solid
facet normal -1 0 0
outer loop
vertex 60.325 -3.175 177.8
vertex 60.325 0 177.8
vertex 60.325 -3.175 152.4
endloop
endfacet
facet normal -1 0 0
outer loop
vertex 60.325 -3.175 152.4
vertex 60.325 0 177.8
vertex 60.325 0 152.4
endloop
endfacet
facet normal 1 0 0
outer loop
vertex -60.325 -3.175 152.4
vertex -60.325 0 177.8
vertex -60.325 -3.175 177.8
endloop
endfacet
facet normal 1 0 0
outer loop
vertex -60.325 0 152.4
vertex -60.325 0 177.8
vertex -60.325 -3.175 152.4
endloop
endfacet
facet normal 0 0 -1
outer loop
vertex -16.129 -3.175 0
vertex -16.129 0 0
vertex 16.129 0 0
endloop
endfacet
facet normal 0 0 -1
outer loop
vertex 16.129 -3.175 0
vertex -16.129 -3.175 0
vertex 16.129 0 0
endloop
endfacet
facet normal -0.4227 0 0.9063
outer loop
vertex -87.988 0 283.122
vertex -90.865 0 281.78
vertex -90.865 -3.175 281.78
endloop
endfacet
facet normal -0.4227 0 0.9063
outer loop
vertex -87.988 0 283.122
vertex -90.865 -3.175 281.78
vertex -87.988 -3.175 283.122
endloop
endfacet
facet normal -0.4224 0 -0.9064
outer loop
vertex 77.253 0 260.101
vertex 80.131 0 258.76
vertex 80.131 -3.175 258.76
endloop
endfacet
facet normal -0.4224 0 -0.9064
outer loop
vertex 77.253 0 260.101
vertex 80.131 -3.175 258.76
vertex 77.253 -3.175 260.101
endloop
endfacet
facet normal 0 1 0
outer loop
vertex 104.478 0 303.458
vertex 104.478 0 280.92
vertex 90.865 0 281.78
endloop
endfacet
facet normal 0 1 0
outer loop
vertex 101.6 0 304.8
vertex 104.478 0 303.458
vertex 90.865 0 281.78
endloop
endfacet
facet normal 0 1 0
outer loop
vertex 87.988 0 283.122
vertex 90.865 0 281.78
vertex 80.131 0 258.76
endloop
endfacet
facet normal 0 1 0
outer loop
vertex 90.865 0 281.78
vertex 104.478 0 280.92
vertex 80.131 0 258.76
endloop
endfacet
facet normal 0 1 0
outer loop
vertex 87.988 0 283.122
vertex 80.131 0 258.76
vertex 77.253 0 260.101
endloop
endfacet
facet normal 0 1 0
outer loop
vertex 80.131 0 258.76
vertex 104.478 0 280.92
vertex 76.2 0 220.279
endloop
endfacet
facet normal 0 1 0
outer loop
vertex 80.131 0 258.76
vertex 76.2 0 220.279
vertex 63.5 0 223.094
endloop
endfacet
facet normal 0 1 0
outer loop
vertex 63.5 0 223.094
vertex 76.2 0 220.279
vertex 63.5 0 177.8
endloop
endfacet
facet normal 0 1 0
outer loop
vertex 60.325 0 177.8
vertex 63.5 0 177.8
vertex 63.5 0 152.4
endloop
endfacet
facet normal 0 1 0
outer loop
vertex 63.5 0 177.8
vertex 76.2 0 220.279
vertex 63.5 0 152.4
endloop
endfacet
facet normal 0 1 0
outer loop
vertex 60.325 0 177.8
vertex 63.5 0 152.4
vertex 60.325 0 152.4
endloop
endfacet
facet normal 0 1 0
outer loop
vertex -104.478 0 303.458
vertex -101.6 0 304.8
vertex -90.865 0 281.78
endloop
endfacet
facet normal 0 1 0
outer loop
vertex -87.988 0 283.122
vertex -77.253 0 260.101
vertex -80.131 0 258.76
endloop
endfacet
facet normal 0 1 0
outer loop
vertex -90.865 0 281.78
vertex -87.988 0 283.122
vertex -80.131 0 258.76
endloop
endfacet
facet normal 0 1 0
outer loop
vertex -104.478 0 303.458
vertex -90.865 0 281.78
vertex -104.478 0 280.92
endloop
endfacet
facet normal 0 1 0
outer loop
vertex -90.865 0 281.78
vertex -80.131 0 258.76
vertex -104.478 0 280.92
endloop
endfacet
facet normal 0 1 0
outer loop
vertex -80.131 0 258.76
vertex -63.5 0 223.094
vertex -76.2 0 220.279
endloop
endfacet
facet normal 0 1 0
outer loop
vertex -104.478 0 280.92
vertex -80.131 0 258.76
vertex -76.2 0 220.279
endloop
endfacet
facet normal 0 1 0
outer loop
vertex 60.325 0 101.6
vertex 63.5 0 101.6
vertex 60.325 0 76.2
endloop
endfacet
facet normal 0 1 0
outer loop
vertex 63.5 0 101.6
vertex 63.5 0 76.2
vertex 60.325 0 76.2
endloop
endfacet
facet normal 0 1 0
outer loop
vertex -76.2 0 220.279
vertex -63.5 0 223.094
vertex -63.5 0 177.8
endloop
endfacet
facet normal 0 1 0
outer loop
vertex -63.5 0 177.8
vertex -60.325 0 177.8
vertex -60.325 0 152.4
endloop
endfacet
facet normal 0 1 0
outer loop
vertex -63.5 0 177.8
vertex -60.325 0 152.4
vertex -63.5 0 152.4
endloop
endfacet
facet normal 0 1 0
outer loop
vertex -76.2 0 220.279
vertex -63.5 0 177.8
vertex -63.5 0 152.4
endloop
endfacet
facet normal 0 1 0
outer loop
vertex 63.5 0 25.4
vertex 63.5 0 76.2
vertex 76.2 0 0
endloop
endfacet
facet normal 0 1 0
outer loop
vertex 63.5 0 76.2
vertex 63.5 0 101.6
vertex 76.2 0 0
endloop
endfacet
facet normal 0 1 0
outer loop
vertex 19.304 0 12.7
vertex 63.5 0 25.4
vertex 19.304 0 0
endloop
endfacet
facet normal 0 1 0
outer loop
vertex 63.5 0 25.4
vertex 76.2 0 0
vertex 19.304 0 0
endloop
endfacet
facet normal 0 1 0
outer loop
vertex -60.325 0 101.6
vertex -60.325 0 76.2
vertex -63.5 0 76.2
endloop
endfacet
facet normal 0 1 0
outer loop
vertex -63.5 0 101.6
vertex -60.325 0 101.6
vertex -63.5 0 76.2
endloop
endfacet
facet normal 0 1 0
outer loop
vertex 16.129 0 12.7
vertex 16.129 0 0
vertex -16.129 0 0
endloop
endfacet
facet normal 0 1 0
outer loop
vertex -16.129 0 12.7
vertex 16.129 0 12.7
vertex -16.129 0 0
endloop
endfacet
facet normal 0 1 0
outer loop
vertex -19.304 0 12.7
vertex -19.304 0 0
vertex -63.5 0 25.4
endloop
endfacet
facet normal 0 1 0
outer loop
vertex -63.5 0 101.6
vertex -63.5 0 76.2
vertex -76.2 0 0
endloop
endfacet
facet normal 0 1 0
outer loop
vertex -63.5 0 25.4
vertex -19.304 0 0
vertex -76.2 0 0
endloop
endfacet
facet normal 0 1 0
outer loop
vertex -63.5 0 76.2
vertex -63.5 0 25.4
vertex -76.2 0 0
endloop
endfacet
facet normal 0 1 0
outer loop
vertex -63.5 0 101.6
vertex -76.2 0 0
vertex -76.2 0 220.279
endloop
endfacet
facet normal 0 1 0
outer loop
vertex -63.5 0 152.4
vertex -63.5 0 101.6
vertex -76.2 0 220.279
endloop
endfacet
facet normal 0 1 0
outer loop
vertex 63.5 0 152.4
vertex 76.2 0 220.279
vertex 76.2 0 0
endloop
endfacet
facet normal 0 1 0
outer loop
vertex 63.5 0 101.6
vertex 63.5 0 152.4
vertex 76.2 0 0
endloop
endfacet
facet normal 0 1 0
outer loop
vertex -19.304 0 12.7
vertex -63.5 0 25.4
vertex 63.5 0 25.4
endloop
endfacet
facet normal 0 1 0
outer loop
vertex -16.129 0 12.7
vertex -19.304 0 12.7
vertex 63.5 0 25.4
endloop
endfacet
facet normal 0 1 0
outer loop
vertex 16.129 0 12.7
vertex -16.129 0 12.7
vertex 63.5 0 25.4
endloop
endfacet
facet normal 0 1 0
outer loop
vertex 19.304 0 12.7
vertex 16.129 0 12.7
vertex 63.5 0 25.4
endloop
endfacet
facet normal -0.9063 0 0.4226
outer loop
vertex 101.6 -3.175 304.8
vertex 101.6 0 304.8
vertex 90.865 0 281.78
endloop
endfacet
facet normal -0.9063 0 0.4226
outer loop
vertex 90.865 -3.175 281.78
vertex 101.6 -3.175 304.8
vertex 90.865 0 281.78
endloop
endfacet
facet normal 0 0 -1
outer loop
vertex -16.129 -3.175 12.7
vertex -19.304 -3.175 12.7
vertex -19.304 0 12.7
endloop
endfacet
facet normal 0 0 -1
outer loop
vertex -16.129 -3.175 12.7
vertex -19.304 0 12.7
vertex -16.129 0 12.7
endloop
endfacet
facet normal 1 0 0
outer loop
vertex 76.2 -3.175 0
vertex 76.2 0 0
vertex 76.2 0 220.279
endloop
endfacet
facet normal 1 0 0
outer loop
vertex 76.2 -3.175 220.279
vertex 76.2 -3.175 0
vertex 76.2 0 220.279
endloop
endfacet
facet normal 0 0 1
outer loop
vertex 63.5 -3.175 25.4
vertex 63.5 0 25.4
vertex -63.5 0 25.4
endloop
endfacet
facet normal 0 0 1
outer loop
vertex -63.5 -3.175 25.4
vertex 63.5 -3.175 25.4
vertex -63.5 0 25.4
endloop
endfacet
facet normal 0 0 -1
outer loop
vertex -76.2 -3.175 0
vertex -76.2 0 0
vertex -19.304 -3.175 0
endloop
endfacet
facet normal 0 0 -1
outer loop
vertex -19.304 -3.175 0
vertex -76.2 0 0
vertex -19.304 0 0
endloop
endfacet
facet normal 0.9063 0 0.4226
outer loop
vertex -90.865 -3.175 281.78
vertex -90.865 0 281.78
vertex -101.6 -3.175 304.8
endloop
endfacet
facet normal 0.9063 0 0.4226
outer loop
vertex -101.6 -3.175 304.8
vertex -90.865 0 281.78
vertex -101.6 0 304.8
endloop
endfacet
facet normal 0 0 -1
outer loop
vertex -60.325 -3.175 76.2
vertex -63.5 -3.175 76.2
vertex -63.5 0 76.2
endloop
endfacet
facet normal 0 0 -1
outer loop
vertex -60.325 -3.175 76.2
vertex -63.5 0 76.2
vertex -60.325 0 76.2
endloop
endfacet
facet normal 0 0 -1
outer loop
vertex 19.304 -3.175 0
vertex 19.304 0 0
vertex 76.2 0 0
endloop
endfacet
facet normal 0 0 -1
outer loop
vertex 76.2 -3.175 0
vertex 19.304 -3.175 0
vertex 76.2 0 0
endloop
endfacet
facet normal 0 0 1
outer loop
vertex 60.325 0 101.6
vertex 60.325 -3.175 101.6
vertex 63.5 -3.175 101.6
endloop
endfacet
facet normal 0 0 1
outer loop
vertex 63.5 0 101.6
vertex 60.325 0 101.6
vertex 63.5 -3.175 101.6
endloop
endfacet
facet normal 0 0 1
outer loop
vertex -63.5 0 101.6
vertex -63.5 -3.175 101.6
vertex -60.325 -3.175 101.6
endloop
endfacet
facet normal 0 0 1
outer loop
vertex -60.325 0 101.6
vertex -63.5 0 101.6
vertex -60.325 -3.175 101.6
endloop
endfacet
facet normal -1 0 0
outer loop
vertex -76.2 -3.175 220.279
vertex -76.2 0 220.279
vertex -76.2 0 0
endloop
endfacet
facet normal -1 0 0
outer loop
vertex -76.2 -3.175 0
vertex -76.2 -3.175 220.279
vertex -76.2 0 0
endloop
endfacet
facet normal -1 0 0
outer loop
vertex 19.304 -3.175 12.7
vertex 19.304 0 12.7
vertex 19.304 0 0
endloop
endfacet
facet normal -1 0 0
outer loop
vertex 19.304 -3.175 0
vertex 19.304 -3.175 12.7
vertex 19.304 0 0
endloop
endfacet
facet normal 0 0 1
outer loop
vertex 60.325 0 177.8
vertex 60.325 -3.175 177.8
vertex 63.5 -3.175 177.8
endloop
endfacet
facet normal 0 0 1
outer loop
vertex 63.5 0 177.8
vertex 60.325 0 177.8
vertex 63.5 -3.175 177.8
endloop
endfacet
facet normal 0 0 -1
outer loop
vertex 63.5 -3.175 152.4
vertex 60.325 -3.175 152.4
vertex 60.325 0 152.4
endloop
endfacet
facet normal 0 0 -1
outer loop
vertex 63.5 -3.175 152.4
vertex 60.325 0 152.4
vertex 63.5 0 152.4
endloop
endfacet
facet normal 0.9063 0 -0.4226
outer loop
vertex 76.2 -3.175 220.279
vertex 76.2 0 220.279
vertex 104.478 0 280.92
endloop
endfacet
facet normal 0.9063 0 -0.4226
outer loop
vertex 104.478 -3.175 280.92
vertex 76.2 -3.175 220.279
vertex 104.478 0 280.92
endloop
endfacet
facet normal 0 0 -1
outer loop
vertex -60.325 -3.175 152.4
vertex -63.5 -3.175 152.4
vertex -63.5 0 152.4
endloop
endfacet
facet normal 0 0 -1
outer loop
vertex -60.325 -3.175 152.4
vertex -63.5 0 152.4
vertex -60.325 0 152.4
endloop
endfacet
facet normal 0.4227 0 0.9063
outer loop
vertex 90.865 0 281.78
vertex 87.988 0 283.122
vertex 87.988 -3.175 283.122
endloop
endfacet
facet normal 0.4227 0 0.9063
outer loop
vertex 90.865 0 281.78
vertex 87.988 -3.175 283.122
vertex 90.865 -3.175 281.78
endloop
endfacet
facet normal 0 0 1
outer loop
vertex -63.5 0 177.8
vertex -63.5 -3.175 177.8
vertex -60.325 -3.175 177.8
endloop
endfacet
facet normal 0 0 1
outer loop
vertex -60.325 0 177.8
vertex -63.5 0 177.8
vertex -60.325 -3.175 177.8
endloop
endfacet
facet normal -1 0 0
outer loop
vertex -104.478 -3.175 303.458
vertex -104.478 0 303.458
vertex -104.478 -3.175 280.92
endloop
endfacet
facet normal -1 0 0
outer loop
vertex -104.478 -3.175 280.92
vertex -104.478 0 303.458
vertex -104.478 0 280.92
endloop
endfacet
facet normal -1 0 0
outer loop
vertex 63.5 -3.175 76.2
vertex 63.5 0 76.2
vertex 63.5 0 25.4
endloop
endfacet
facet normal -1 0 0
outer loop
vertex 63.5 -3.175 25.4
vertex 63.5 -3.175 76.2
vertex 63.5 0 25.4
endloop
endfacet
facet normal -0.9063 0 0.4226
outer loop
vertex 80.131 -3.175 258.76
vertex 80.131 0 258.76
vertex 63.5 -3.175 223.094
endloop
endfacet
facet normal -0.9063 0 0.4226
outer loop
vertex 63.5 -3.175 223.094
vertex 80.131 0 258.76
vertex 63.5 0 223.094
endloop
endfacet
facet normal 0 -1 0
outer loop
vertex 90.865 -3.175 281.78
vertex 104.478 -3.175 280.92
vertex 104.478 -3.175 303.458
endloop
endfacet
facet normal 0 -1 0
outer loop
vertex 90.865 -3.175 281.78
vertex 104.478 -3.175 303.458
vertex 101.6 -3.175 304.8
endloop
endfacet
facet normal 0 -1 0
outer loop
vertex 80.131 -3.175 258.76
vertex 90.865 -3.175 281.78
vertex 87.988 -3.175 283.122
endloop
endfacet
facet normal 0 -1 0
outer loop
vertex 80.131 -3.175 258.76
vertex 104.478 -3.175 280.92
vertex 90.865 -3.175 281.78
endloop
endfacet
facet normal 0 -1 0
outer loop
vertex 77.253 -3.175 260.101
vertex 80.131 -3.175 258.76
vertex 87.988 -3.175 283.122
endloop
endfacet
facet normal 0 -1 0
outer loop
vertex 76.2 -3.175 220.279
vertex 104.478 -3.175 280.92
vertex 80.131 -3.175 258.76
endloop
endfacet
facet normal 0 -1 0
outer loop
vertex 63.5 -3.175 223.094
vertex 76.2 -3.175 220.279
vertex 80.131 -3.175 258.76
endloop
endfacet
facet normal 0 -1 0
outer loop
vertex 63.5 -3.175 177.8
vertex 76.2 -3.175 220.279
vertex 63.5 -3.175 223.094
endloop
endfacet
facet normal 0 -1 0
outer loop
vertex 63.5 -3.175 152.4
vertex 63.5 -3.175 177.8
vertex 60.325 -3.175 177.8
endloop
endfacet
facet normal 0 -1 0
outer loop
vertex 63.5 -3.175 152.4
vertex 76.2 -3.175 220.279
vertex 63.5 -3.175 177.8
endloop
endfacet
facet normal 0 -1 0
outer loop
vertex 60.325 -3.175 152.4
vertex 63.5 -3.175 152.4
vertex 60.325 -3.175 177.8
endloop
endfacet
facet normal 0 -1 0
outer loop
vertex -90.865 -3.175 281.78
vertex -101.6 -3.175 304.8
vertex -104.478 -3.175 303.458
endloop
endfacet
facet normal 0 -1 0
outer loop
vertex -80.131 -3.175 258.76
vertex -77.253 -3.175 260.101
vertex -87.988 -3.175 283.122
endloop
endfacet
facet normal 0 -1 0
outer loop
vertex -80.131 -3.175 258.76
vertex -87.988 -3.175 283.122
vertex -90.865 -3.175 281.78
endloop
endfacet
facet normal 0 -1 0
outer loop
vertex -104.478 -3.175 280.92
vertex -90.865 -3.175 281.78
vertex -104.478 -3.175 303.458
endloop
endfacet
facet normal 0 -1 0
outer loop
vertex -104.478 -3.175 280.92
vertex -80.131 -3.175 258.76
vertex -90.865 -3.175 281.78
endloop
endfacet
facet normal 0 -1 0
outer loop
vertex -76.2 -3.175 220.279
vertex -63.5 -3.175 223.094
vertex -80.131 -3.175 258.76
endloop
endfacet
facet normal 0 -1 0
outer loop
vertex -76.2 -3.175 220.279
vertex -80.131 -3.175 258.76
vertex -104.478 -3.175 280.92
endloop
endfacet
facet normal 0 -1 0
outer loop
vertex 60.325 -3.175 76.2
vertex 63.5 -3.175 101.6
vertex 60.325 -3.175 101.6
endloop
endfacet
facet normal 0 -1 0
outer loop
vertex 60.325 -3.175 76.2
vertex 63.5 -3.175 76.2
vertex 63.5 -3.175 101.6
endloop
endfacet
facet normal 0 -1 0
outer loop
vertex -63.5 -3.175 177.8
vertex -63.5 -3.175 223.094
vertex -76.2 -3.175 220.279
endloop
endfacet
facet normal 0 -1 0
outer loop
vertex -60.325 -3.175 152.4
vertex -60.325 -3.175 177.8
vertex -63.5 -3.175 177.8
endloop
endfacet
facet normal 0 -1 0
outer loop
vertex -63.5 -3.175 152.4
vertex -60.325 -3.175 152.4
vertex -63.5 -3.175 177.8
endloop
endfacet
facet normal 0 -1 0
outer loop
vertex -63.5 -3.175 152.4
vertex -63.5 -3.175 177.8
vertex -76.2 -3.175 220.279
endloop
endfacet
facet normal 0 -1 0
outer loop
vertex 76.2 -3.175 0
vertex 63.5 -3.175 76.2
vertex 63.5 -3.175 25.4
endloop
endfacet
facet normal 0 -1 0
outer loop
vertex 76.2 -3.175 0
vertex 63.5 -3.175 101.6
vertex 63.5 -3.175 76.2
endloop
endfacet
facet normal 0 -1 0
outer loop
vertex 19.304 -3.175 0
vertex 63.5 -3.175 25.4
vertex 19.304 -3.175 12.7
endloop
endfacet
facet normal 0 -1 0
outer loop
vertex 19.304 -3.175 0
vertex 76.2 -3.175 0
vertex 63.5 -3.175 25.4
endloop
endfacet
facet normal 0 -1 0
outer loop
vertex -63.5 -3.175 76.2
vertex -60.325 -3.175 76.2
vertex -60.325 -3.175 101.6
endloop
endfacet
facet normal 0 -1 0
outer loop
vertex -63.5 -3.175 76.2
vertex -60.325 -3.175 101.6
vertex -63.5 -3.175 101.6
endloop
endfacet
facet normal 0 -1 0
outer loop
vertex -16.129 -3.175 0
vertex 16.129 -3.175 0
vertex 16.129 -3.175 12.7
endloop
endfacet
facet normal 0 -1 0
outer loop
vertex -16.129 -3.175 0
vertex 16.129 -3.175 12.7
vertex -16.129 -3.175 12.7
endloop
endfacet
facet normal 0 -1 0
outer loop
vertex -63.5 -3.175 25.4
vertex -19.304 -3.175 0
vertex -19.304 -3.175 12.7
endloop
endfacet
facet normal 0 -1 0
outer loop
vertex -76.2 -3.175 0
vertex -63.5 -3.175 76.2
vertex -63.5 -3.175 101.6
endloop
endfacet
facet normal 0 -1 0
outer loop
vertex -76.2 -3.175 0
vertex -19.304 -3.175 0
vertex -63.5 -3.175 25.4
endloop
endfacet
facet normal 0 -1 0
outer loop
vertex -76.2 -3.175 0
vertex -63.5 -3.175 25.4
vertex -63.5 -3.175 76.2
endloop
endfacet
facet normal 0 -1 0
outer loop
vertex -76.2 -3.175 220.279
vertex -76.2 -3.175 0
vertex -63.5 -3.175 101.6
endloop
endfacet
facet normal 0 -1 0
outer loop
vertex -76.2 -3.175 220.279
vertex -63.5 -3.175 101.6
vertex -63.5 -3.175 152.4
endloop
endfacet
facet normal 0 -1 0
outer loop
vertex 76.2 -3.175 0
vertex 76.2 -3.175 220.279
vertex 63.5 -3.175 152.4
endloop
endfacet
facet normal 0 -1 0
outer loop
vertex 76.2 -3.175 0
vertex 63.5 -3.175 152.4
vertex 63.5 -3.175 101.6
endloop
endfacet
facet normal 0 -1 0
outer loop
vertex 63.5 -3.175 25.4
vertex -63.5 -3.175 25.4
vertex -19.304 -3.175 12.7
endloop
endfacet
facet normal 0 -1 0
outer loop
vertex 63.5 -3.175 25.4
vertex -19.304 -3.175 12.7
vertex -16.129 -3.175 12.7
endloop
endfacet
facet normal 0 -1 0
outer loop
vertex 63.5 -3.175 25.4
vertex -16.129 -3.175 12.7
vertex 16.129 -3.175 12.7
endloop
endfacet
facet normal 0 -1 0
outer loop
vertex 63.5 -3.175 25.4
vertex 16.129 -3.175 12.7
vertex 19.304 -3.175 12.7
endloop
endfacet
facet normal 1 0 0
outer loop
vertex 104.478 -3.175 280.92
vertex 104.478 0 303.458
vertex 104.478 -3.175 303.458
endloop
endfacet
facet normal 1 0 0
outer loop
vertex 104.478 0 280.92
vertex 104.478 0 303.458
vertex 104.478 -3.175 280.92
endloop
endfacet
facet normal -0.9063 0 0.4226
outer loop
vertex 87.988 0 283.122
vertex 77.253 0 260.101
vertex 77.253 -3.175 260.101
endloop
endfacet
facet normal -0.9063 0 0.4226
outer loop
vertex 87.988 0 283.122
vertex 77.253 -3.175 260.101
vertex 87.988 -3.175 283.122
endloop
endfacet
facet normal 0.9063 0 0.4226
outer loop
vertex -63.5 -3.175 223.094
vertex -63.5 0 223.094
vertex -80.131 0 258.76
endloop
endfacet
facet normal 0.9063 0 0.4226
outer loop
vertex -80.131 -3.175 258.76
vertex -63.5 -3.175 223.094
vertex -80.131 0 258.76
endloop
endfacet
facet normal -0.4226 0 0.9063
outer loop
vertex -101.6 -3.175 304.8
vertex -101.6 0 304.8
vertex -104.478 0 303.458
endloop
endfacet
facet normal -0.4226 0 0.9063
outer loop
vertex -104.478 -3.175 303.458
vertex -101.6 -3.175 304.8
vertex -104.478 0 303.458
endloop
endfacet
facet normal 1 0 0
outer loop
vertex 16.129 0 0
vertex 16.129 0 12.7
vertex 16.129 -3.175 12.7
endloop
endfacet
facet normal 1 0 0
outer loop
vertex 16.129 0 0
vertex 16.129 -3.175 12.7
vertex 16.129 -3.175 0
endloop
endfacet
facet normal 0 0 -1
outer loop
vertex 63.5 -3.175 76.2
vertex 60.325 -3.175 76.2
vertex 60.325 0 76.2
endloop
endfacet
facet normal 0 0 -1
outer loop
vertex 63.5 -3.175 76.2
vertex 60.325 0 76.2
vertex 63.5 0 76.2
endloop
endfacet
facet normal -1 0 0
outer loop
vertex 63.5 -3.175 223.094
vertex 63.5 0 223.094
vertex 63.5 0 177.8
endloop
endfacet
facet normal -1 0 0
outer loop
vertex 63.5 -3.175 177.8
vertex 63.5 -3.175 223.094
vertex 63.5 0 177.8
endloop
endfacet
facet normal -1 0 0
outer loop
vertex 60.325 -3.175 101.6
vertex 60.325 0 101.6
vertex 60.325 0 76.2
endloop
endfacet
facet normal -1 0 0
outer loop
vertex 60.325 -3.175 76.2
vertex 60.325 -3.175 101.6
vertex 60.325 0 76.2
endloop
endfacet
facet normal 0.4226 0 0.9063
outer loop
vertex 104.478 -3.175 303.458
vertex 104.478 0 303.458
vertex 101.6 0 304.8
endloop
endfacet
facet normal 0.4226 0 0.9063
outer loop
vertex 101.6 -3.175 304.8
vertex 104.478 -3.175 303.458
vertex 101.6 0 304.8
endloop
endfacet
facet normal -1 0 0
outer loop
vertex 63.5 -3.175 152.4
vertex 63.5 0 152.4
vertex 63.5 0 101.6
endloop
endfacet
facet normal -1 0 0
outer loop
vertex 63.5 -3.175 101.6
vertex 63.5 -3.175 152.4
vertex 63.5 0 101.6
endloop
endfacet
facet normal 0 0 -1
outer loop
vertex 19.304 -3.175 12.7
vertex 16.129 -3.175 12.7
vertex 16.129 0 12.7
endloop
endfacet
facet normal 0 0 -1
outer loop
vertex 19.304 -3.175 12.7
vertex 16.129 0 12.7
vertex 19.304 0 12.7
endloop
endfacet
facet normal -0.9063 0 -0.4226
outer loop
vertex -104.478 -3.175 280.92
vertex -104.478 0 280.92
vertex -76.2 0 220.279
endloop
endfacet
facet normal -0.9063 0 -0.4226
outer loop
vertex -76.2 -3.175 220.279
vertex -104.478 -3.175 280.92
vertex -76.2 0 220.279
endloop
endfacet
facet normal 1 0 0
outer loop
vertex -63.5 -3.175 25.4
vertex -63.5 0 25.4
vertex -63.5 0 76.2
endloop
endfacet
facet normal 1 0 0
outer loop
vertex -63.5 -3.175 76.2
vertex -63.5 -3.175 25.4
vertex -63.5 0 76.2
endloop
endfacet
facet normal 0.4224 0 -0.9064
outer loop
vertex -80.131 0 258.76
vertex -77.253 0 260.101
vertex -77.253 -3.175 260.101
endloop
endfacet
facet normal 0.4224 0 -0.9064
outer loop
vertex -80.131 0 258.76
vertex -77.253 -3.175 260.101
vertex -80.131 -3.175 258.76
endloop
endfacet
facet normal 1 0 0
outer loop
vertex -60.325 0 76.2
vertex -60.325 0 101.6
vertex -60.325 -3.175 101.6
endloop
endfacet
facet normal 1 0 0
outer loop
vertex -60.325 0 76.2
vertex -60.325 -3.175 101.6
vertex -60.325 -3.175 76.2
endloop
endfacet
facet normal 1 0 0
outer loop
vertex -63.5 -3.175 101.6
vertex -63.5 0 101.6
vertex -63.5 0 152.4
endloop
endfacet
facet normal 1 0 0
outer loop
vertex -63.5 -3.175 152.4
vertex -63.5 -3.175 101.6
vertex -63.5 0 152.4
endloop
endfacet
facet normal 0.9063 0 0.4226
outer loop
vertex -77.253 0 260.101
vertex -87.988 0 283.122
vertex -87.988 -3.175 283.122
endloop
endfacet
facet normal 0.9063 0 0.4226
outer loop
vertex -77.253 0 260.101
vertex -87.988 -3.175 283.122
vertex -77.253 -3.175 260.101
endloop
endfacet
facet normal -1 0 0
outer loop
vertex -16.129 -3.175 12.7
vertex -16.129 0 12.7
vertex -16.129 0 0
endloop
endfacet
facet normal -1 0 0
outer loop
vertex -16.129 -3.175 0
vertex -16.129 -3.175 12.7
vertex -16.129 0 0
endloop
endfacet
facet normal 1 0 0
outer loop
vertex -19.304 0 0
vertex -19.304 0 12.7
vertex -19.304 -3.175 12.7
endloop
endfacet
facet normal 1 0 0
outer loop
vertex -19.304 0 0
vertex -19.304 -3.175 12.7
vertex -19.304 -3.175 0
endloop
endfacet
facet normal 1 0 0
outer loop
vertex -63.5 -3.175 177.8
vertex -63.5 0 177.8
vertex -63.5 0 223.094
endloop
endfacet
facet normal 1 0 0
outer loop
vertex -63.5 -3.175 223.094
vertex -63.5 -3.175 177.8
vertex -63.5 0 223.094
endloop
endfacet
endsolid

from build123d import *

# Parameters (mm, degrees)
BASE_FLANGE1_DEPTH = 3.175
SKETCH7_W          = 3.175
SKETCH7_H          = 12.7
CUT_EXTRUDE1_DEPTH = 326.126156068
SKETCH12_W         = 3.175
SKETCH12_H         = 25.4
TAB1_DEPTH         = 3.175
CUT_EXTRUDE2_DEPTH = 326.126156068


# Sheet-metal steps are written as plain solids
with BuildPart() as part:
    # Sketch1 → Base-Flange1 (new body)
    with BuildSketch(Plane(origin=(0, 0, 0), x_dir=(1, 0, 0), z_dir=(0, 1, 0))):
        Polygon((-76.2, 0), (76.2, 0), (76.2, -220.278764113), (113.110108895, -299.432748076), (101.6, -304.8), (63.5, -223.094286329), (63.5, -25.4), (-63.5, -25.4), (-63.5, -223.094286329), (-101.6, -304.8), (-113.110108895, -299.432748076), (-76.2, -220.278764113), align=None)
    extrude(amount=-BASE_FLANGE1_DEPTH)

    # Sketch7 → Cut-Extrude1 (cut, through all)
    with BuildSketch(Plane(origin=(0, 0, 0), x_dir=(1, 0, 0), z_dir=(0, 1, 0))):
        with Locations((-17.7165, -6.35)):
            Rectangle(SKETCH7_W, SKETCH7_H)
        with Locations((17.7165, -6.35)):
            Rectangle(SKETCH7_W, SKETCH7_H)
    extrude(amount=-CUT_EXTRUDE1_DEPTH, mode=Mode.SUBTRACT)

    # Sketch12 → Tab1 (add)
    with BuildSketch(Plane(origin=(0, 0, 0), x_dir=(1, 0, 0), z_dir=(0, 1, 0))):
        with Locations((-61.9125, -88.9)):
            Rectangle(SKETCH12_W, SKETCH12_H)
        Polygon((-80.130992304, -258.759564419), (-90.865496152, -281.779782209), (-87.987968928, -283.12159519), (-77.25346508, -260.1013774), align=None)
        with Locations((-61.9125, -165.1)):
            Rectangle(SKETCH12_W, SKETCH12_H)
        Polygon((77.25346508, -260.1013774), (87.987968928, -283.12159519), (90.865496152, -281.779782209), (80.130992304, -258.759564419), align=None)
        with Locations((61.9125, -165.1)):
            Rectangle(SKETCH12_W, SKETCH12_H)
        with Locations((61.9125, -88.9)):
            Rectangle(SKETCH12_W, SKETCH12_H)
    extrude(amount=-TAB1_DEPTH)

    # Sketch13 → Cut-Extrude2 (cut, through all)
    with BuildSketch(Plane(origin=(0, 0, 0), x_dir=(1, 0, 0), z_dir=(0, 1, 0))):
        Polygon((-104.477527224, -303.458187019), (-104.477527224, -280.920116939), (-113.110108895, -299.432748076), align=None)
        Polygon((104.477527224, -303.458187019), (104.477527224, -280.920116939), (113.110108895, -299.432748076), align=None)
    extrude(amount=-CUT_EXTRUDE2_DEPTH, mode=Mode.SUBTRACT)


solid = part.part
